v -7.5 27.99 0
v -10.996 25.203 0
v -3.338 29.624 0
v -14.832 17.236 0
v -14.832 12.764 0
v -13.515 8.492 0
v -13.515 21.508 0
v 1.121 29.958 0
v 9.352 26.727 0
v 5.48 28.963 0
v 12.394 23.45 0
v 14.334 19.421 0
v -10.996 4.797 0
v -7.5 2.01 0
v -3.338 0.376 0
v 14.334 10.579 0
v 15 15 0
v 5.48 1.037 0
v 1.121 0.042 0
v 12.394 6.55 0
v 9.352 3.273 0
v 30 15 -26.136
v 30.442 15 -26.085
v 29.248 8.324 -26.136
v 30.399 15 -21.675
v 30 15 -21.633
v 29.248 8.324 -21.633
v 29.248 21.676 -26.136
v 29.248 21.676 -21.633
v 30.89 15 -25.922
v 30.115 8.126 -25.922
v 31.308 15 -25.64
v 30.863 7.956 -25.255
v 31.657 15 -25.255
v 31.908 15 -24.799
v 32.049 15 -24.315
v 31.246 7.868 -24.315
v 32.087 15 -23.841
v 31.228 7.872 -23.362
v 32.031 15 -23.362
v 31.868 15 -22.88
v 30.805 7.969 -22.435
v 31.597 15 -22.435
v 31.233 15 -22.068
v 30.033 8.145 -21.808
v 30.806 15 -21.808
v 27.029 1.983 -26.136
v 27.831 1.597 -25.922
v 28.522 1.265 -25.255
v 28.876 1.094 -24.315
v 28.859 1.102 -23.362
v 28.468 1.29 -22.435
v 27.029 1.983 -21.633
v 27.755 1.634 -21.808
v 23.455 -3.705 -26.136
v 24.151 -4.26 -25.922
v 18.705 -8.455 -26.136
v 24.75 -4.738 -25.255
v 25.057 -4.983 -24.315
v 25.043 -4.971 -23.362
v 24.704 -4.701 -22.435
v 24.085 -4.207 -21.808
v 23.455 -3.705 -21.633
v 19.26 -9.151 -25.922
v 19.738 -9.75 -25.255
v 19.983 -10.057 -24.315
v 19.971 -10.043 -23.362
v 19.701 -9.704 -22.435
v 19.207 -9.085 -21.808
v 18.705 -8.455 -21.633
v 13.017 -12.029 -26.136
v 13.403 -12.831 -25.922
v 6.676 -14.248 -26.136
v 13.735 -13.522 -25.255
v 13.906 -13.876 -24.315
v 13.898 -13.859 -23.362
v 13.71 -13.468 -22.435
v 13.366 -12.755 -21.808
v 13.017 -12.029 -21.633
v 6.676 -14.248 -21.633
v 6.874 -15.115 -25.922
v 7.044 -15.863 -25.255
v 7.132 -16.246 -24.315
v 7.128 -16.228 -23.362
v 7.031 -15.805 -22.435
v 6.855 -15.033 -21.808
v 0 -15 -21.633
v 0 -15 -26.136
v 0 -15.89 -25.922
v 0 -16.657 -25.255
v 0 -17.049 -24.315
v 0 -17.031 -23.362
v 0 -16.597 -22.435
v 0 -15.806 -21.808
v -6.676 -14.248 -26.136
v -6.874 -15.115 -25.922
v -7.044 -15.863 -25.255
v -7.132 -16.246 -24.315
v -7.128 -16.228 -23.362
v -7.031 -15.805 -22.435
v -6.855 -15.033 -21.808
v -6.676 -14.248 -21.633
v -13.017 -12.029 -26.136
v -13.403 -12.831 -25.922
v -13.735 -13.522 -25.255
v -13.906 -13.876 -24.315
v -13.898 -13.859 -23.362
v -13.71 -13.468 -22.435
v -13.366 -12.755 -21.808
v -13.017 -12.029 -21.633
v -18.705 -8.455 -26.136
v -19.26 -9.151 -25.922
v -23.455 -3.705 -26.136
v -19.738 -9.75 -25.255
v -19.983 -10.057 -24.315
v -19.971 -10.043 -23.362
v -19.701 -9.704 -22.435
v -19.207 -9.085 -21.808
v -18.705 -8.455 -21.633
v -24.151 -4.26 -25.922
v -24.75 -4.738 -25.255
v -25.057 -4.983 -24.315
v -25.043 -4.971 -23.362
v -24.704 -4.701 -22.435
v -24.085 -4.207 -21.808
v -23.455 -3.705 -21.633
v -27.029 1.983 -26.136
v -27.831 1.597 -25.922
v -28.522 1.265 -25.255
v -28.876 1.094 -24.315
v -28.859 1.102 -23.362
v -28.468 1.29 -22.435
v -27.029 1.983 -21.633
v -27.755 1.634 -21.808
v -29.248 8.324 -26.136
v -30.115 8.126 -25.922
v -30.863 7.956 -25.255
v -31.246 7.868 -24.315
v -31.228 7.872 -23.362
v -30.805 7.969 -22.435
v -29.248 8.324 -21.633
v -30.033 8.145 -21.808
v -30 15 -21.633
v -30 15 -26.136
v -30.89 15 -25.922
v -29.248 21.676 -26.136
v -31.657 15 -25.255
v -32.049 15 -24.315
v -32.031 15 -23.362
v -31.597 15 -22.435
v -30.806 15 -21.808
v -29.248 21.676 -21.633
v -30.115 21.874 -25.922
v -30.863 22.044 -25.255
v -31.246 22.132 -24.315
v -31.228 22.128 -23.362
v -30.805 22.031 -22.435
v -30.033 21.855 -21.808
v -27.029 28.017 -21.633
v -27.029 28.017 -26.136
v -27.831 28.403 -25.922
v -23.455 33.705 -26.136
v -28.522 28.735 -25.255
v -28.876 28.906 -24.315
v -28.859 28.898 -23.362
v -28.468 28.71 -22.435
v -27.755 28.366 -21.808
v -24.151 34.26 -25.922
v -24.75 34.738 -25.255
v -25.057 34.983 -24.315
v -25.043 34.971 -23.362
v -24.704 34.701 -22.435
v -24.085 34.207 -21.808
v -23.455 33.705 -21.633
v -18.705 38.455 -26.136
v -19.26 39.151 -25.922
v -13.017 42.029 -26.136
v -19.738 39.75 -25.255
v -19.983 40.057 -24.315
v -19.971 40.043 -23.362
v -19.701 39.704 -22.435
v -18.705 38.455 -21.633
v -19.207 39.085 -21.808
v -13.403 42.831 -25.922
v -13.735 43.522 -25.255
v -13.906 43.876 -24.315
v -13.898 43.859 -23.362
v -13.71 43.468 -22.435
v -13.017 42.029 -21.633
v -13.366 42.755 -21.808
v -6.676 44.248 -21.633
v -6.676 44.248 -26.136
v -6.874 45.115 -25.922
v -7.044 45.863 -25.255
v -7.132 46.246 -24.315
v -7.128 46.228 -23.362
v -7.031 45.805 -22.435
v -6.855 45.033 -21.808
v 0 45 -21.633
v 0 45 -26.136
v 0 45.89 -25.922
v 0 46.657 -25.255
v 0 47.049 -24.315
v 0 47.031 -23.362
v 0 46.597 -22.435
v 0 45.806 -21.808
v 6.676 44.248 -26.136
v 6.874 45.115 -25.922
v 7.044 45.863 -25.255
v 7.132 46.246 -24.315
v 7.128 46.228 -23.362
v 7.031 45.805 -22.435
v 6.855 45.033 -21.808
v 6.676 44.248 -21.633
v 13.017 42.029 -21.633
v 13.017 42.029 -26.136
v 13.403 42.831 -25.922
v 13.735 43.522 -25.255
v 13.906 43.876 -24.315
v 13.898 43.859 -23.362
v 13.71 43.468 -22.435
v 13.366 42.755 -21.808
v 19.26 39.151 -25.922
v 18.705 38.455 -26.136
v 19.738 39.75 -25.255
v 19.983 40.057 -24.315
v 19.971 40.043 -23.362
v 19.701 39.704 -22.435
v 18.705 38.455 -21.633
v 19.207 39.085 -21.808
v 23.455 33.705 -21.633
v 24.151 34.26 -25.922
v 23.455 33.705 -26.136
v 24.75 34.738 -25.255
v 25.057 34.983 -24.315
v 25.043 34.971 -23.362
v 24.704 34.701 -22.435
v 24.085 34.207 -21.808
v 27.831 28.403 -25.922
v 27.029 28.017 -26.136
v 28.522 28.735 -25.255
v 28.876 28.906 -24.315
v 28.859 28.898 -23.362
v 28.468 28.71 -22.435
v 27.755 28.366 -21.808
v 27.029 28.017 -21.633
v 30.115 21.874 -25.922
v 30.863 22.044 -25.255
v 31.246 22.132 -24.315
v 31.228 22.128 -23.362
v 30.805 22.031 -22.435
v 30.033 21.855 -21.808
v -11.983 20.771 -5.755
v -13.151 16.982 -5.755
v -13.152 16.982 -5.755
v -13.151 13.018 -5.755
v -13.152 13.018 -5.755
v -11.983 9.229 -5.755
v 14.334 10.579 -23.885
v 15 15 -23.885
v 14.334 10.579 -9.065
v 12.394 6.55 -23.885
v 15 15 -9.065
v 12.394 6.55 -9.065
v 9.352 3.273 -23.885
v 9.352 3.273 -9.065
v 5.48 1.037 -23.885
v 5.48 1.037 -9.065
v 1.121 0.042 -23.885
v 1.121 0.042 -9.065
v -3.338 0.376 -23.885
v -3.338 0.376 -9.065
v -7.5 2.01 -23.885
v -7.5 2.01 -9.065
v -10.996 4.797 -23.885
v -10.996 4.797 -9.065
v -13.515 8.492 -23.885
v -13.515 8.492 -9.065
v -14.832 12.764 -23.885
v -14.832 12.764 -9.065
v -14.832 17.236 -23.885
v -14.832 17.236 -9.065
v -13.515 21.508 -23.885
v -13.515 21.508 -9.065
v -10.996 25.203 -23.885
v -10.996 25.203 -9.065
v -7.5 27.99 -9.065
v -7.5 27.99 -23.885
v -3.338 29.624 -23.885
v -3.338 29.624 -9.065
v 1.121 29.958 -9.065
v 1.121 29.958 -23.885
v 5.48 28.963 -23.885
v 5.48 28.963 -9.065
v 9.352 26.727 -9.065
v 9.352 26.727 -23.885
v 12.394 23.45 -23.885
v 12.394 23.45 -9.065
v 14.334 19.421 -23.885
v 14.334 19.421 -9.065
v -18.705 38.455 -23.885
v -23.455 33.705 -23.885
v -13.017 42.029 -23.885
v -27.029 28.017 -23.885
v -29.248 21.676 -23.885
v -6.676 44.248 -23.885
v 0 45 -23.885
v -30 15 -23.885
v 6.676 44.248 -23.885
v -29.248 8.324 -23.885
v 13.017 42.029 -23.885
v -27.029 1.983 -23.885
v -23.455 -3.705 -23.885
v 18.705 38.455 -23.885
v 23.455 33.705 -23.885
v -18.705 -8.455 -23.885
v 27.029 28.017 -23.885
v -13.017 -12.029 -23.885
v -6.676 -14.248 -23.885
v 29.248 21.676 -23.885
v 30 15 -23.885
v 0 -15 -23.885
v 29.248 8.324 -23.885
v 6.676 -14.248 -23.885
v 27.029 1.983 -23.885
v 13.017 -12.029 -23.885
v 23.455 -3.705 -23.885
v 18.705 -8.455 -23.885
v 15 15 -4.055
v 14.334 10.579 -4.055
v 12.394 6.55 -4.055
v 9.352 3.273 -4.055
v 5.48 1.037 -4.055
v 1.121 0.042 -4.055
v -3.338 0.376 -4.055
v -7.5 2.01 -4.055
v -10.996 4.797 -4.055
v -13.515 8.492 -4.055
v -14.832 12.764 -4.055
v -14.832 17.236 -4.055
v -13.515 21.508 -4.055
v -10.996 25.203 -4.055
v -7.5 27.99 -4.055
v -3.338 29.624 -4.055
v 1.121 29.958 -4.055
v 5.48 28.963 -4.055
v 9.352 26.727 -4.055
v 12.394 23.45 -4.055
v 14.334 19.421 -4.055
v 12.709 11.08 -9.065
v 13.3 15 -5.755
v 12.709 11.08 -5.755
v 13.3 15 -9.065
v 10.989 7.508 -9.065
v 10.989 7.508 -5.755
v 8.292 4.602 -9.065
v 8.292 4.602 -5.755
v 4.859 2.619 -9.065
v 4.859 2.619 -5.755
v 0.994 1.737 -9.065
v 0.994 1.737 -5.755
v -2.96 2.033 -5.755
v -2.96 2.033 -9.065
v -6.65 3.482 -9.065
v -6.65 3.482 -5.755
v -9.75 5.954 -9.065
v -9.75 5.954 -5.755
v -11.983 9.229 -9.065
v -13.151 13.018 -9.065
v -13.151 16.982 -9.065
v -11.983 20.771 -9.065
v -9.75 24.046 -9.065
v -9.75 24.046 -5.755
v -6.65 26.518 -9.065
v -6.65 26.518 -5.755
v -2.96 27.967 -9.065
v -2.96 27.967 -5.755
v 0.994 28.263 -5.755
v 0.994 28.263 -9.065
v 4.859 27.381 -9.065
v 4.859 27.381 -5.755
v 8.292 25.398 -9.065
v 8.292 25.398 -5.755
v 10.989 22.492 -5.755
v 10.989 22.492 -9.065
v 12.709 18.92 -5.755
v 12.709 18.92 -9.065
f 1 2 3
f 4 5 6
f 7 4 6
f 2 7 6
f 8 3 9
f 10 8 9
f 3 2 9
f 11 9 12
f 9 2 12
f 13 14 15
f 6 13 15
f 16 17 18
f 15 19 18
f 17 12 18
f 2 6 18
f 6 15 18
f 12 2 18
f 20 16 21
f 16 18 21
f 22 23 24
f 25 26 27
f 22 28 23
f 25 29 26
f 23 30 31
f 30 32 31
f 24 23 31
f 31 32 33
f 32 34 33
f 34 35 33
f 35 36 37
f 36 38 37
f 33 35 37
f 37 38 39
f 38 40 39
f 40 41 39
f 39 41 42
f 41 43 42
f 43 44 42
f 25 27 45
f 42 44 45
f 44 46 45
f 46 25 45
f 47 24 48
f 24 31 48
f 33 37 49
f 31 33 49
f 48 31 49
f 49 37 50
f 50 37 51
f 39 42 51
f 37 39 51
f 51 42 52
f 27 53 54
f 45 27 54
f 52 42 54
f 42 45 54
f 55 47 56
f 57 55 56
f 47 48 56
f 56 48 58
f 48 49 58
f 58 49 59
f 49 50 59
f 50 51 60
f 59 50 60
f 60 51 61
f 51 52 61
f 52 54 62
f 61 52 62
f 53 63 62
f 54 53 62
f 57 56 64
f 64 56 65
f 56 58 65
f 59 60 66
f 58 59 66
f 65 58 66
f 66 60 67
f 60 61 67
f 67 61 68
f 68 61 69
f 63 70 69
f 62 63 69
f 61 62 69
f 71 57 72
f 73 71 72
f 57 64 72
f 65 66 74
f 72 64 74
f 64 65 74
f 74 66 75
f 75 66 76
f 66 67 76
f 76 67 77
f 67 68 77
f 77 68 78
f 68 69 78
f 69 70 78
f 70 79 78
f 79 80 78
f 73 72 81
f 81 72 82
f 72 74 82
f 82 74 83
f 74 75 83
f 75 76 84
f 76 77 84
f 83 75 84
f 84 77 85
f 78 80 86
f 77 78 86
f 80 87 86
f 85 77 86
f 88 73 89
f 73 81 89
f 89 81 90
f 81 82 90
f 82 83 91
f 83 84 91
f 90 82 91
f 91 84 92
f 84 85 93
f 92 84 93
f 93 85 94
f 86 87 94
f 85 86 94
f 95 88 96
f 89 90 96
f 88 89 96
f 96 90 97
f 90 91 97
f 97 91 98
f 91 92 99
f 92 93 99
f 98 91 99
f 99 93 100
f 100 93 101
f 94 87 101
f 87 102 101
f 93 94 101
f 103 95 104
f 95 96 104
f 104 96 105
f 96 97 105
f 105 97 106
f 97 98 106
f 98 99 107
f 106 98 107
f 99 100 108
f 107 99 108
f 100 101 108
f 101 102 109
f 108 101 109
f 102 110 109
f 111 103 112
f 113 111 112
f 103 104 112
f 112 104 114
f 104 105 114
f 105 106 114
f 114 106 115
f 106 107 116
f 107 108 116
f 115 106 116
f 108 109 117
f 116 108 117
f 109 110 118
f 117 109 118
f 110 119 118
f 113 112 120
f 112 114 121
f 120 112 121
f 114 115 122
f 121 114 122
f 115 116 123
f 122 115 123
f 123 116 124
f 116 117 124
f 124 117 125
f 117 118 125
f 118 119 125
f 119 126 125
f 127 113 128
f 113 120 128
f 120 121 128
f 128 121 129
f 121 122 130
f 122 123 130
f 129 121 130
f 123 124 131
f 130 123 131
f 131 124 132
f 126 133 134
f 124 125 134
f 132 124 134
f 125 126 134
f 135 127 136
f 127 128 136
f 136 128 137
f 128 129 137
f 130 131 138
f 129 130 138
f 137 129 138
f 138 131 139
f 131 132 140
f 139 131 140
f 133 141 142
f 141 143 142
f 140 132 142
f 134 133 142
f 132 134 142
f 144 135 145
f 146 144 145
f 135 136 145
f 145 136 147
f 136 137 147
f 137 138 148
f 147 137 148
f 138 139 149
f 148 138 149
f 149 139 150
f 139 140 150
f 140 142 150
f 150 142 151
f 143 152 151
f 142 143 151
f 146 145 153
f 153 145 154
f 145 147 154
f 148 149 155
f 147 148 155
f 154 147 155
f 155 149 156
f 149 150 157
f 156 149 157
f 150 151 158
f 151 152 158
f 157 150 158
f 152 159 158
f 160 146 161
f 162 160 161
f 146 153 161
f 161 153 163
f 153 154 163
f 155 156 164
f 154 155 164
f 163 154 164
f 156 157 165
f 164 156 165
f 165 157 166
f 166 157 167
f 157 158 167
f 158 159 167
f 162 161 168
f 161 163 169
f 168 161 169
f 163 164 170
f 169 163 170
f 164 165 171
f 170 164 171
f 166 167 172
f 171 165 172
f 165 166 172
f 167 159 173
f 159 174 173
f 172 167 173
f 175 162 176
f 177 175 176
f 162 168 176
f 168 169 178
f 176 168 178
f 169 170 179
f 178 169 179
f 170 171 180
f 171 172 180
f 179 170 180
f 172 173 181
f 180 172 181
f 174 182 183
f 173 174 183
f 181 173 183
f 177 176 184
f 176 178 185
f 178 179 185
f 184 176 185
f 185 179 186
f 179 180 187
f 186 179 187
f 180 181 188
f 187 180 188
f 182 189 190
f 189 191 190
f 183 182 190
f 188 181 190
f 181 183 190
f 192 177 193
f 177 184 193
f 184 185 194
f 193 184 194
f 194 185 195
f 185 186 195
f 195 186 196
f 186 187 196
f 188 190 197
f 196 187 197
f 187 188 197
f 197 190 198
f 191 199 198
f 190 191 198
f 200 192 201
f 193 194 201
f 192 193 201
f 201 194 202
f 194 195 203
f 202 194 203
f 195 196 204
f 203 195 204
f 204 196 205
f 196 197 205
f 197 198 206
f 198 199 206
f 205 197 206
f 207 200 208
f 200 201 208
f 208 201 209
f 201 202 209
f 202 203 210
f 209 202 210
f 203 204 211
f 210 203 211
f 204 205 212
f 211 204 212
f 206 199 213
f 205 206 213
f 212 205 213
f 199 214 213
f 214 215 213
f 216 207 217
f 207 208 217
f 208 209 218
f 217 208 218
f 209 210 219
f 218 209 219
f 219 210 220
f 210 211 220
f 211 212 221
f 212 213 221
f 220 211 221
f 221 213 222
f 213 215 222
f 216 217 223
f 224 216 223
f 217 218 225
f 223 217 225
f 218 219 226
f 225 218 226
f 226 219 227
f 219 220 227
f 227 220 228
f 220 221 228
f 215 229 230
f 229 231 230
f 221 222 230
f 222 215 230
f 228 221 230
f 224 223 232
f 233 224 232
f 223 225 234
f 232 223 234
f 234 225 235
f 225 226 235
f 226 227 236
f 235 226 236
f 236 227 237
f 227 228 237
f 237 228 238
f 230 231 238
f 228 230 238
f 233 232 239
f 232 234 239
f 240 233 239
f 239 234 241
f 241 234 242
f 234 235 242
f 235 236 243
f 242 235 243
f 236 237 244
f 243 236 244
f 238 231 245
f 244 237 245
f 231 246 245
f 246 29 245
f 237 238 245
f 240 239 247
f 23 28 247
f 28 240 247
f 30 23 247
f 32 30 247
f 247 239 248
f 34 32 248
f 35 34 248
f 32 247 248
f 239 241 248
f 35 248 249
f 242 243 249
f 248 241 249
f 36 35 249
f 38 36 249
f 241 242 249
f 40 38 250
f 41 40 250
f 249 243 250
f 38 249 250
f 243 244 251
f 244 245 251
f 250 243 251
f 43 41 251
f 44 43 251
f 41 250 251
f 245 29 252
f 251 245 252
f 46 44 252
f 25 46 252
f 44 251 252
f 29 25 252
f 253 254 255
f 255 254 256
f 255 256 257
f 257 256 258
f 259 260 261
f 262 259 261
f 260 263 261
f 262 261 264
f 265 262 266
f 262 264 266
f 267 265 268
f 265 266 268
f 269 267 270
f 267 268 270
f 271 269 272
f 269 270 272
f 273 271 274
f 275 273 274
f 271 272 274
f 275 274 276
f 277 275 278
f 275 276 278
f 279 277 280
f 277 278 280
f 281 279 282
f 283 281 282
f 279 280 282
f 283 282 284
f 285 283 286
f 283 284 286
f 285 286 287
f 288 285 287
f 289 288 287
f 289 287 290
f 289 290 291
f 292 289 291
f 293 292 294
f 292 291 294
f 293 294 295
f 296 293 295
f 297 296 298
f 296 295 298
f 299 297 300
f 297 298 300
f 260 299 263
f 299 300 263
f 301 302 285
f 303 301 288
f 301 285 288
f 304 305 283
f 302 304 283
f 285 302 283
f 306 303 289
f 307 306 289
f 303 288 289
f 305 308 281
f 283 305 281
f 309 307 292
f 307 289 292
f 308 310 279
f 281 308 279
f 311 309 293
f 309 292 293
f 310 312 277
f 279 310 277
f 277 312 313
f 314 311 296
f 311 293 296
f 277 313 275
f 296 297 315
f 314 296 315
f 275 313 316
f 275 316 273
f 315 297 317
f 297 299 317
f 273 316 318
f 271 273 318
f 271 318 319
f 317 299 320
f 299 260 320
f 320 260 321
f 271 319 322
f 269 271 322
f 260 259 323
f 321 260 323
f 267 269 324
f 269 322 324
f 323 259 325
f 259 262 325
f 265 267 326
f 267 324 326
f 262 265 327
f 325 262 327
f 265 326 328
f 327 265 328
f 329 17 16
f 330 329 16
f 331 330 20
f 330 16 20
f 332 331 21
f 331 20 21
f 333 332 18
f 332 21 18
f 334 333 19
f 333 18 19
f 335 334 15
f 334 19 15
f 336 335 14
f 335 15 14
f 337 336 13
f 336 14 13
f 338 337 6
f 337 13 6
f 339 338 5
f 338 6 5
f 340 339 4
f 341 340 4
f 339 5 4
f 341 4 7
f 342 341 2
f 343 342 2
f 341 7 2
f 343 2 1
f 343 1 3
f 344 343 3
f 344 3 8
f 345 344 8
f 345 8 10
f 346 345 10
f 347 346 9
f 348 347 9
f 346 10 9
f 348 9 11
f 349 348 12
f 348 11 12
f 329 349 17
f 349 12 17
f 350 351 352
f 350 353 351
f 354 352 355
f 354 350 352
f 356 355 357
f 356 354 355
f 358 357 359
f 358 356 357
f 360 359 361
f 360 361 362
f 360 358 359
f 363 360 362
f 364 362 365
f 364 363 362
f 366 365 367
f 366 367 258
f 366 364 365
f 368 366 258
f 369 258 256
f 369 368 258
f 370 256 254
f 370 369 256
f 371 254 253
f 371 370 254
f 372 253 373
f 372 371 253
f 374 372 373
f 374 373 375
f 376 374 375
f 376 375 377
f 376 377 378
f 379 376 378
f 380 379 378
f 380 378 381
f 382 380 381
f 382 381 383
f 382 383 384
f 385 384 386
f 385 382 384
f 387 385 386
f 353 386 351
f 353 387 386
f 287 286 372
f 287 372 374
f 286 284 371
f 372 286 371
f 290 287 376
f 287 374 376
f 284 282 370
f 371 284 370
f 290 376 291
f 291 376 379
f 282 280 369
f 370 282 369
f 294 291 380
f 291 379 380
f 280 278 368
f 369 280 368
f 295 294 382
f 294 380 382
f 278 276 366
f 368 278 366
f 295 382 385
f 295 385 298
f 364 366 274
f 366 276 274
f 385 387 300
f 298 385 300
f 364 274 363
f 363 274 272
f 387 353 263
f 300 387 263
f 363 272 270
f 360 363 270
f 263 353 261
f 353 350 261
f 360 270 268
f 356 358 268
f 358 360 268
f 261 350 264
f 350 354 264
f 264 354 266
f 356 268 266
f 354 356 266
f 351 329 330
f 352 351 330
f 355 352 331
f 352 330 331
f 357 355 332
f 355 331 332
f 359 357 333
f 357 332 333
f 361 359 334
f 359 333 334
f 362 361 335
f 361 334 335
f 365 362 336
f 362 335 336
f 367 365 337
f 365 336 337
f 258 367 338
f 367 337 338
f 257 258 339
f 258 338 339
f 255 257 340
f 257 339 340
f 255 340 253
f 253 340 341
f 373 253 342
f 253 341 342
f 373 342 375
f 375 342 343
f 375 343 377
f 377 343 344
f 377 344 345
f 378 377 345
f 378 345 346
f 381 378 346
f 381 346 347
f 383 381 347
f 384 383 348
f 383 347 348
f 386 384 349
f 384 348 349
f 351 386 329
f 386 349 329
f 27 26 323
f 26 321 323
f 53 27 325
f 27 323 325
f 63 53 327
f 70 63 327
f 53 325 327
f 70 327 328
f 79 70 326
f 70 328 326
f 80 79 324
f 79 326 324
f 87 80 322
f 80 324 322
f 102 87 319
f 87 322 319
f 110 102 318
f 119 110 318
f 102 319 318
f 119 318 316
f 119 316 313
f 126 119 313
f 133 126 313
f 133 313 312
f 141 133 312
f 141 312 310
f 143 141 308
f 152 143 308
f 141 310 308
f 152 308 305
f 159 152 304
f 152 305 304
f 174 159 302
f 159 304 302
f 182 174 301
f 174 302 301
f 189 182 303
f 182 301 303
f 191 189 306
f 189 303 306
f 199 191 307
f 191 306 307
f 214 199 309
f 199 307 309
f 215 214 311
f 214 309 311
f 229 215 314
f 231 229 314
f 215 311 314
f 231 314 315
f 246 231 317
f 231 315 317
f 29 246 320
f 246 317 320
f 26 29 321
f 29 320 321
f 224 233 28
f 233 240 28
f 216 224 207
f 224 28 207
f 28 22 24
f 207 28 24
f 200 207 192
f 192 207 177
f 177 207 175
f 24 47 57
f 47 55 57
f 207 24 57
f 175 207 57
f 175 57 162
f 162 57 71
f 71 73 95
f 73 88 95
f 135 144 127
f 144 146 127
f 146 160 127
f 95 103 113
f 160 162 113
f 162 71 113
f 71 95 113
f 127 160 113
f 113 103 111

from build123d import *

# Parameters (mm, degrees)
SKETCH1_W     = 3.309352518
SKETCH1_H     = 13.3
CHAMFER1_SIZE = 1.7


with BuildPart() as part:
    # Sketch1 → Revolve1 (revolve)
    with BuildSketch(Plane(origin=(0, 0, 0), x_dir=(0, 0, -1), z_dir=(1, 0, 0)), mode=Mode.PRIVATE) as revolve1_sk:
        Polygon((23.884892086, 15), (23.884892086, 30), (9.064748201, 30), (9.064748201, 28.3), (9.064748201, 15), align=None)
        with BuildLine():
            add(Edge.make_bspline(
                [(26.136310791, 45), (26.136310791, 47.087884729), (23.884892086, 47.087884729), (21.633473381, 47.087884729), (21.633473381, 45)],
                knots=[0, 0, 0, 1.570796327, 1.570796327, 3.141592654, 3.141592654, 3.141592654], degree=2, weights=[1, 0.707106781, 1, 0.707106781, 1]))
            Line((21.633473381, 45), (23.884892086, 45))
            Line((23.884892086, 45), (23.884892086, 30))
            Line((23.884892086, 30), (23.884892086, 15))
            Line((23.884892086, 15), (26.136310791, 15))
            Line((26.136310791, 15), (26.136310791, 45))
        make_face()
        Polygon((5.755395683, 15), (5.755395683, 28.3), (5.755395683, 30), (0, 30), (0, 15), align=None)
        with Locations((7.410071942, 21.65)):
            Rectangle(SKETCH1_W, SKETCH1_H)
    revolve(revolve1_sk.sketch.rotate(Axis((0, 15, 10.547508617), (0, 0, -1)), 90), axis=Axis((0, 15, 10.547508617), (0, 0, -1)))

    # Chamfer1
    chamfer1_edges = [part.edges().sort_by_distance(p)[0] for p in [
        (-15, 15, -5.755395683),
    ]]
    chamfer(chamfer1_edges, length=CHAMFER1_SIZE - 0.0001)  # a hair under: the kernel refuses the full size


solid = part.part
